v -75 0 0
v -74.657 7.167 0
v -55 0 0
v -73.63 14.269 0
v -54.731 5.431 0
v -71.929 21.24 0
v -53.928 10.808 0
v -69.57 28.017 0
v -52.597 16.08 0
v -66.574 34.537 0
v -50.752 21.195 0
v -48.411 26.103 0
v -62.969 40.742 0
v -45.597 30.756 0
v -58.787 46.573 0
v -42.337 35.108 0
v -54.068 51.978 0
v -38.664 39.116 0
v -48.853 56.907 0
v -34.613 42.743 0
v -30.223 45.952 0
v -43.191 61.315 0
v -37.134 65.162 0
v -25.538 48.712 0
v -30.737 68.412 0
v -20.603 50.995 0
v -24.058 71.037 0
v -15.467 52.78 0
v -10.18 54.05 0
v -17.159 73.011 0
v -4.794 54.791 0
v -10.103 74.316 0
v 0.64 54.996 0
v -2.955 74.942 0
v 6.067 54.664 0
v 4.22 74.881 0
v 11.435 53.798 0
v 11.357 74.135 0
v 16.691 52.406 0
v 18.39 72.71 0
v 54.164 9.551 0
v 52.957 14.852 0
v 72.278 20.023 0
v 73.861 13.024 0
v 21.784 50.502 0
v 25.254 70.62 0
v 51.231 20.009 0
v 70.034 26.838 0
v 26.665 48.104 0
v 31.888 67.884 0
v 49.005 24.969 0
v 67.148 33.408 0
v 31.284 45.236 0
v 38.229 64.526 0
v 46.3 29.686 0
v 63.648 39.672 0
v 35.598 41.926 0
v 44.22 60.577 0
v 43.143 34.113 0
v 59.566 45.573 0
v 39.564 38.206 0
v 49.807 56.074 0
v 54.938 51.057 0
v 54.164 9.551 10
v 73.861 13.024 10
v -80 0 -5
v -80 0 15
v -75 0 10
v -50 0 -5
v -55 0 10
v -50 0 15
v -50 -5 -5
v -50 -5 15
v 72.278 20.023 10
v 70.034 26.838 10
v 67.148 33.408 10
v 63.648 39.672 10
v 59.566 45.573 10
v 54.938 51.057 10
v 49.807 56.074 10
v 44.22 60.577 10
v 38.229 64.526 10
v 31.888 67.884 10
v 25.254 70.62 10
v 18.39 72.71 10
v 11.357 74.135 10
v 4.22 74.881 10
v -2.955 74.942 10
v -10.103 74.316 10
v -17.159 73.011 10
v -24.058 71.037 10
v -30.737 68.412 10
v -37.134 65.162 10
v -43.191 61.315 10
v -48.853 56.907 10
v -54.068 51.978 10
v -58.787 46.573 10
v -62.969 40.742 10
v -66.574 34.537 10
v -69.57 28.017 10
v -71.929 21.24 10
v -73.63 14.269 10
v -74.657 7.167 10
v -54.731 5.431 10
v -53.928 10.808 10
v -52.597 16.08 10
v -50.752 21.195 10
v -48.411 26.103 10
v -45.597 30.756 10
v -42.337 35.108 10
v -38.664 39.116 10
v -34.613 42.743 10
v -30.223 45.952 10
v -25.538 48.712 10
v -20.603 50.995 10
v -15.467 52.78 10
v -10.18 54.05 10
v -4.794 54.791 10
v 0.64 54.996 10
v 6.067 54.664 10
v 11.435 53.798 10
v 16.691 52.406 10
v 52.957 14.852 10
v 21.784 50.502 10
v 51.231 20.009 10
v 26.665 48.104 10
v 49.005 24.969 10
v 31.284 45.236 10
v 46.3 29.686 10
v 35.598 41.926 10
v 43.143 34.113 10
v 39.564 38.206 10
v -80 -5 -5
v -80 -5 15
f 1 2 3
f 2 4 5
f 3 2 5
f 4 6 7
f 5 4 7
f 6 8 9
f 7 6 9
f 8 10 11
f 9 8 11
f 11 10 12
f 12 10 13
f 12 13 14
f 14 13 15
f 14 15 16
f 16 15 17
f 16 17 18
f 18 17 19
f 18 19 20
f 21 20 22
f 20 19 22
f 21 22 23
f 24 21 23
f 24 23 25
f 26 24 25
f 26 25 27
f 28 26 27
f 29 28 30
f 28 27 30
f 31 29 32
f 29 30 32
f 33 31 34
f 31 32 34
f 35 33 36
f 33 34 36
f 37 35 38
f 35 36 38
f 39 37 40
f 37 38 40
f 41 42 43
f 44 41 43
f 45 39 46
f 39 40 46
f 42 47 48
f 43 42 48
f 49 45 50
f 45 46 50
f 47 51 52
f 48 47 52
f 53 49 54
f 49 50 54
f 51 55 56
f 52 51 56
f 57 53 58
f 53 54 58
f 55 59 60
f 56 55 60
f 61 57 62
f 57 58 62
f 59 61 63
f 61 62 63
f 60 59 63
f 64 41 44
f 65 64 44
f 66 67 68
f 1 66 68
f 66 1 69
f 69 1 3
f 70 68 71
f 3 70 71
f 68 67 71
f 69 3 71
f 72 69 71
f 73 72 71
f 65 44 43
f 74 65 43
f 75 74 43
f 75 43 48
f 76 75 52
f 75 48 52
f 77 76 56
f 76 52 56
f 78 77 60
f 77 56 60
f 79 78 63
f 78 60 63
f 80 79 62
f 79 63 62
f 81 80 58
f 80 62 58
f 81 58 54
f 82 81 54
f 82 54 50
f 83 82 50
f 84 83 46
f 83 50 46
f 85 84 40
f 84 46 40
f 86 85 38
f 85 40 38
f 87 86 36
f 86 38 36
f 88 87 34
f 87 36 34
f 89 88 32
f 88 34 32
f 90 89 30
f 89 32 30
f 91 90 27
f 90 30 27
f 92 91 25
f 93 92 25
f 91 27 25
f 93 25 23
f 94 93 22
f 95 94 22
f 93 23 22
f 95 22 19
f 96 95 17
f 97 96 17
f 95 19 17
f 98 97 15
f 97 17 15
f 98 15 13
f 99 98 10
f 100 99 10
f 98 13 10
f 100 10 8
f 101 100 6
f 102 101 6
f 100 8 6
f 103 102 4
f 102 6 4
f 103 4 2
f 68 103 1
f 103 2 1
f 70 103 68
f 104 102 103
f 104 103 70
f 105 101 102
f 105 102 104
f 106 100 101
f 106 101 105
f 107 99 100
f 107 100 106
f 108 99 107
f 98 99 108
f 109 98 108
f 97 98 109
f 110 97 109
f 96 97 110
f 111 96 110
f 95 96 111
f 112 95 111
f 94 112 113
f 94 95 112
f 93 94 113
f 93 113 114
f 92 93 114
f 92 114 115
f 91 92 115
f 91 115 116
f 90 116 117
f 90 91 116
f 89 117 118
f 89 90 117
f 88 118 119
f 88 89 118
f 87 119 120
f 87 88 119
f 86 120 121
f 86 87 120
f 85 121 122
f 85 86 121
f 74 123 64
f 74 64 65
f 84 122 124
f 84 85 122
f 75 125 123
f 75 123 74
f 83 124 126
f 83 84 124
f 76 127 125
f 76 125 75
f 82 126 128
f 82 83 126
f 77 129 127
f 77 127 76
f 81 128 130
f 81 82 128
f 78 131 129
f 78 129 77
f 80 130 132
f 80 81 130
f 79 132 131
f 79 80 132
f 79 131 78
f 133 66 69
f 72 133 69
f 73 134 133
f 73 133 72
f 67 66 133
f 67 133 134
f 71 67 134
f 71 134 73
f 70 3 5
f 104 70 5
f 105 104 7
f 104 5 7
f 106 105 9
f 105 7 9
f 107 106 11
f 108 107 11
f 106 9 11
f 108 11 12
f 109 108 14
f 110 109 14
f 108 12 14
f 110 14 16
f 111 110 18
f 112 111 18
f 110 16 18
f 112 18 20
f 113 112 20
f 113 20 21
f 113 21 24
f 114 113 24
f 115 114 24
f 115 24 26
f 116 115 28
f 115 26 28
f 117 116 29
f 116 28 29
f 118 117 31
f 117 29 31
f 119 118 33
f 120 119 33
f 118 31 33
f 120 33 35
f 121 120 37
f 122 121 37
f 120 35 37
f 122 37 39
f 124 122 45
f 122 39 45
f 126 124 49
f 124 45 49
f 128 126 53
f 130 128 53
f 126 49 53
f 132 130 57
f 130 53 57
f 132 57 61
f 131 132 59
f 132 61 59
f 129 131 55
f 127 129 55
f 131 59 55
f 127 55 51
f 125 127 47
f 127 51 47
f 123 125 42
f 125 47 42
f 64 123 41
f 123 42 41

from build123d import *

# Parameters (mm, degrees)
BOSS_EXTRUDE1_DEPTH = 10
SKETCH2_W           = 30
SKETCH2_H           = 20
SKETCH2_W_2         = 20
SKETCH2_H_2         = 10
BOSS_EXTRUDE2_DEPTH = 5


with BuildPart() as part:
    # Sketch1 → Boss-Extrude1 (new body)
    with BuildSketch(Plane.XY):
        with BuildLine():
            Line((-75, 0), (-55, 0))
            ThreePointArc((-55, 0), (-4.793565851, 54.790708395), (54.164426416, 9.550649772))
            Line((54.164426416, 9.550649772), (73.860581476, 13.023613325))
            ThreePointArc((73.860581476, 13.023613325), (-6.536680706, 74.714602357), (-75, 0))
        make_face()
    extrude(amount=BOSS_EXTRUDE1_DEPTH)

    # Sketch2 → Boss-Extrude2 (add)
    with BuildSketch(Plane.XZ):
        with Locations((-65, 5)):
            Rectangle(SKETCH2_W, SKETCH2_H)
        with Locations((-65, 5)):
            Rectangle(SKETCH2_W_2, SKETCH2_H_2, mode=Mode.SUBTRACT)
        Polygon((-65, 5), (-75, 10), (-75, 0), align=None)
        Polygon((-55, 10), (-75, 10), (-65, 5), align=None)
        Polygon((-55, 10), (-65, 5), (-55, 0), align=None)
        Polygon((-55, 0), (-65, 5), (-75, 0), align=None)
    extrude(amount=BOSS_EXTRUDE2_DEPTH)


solid = part.part
